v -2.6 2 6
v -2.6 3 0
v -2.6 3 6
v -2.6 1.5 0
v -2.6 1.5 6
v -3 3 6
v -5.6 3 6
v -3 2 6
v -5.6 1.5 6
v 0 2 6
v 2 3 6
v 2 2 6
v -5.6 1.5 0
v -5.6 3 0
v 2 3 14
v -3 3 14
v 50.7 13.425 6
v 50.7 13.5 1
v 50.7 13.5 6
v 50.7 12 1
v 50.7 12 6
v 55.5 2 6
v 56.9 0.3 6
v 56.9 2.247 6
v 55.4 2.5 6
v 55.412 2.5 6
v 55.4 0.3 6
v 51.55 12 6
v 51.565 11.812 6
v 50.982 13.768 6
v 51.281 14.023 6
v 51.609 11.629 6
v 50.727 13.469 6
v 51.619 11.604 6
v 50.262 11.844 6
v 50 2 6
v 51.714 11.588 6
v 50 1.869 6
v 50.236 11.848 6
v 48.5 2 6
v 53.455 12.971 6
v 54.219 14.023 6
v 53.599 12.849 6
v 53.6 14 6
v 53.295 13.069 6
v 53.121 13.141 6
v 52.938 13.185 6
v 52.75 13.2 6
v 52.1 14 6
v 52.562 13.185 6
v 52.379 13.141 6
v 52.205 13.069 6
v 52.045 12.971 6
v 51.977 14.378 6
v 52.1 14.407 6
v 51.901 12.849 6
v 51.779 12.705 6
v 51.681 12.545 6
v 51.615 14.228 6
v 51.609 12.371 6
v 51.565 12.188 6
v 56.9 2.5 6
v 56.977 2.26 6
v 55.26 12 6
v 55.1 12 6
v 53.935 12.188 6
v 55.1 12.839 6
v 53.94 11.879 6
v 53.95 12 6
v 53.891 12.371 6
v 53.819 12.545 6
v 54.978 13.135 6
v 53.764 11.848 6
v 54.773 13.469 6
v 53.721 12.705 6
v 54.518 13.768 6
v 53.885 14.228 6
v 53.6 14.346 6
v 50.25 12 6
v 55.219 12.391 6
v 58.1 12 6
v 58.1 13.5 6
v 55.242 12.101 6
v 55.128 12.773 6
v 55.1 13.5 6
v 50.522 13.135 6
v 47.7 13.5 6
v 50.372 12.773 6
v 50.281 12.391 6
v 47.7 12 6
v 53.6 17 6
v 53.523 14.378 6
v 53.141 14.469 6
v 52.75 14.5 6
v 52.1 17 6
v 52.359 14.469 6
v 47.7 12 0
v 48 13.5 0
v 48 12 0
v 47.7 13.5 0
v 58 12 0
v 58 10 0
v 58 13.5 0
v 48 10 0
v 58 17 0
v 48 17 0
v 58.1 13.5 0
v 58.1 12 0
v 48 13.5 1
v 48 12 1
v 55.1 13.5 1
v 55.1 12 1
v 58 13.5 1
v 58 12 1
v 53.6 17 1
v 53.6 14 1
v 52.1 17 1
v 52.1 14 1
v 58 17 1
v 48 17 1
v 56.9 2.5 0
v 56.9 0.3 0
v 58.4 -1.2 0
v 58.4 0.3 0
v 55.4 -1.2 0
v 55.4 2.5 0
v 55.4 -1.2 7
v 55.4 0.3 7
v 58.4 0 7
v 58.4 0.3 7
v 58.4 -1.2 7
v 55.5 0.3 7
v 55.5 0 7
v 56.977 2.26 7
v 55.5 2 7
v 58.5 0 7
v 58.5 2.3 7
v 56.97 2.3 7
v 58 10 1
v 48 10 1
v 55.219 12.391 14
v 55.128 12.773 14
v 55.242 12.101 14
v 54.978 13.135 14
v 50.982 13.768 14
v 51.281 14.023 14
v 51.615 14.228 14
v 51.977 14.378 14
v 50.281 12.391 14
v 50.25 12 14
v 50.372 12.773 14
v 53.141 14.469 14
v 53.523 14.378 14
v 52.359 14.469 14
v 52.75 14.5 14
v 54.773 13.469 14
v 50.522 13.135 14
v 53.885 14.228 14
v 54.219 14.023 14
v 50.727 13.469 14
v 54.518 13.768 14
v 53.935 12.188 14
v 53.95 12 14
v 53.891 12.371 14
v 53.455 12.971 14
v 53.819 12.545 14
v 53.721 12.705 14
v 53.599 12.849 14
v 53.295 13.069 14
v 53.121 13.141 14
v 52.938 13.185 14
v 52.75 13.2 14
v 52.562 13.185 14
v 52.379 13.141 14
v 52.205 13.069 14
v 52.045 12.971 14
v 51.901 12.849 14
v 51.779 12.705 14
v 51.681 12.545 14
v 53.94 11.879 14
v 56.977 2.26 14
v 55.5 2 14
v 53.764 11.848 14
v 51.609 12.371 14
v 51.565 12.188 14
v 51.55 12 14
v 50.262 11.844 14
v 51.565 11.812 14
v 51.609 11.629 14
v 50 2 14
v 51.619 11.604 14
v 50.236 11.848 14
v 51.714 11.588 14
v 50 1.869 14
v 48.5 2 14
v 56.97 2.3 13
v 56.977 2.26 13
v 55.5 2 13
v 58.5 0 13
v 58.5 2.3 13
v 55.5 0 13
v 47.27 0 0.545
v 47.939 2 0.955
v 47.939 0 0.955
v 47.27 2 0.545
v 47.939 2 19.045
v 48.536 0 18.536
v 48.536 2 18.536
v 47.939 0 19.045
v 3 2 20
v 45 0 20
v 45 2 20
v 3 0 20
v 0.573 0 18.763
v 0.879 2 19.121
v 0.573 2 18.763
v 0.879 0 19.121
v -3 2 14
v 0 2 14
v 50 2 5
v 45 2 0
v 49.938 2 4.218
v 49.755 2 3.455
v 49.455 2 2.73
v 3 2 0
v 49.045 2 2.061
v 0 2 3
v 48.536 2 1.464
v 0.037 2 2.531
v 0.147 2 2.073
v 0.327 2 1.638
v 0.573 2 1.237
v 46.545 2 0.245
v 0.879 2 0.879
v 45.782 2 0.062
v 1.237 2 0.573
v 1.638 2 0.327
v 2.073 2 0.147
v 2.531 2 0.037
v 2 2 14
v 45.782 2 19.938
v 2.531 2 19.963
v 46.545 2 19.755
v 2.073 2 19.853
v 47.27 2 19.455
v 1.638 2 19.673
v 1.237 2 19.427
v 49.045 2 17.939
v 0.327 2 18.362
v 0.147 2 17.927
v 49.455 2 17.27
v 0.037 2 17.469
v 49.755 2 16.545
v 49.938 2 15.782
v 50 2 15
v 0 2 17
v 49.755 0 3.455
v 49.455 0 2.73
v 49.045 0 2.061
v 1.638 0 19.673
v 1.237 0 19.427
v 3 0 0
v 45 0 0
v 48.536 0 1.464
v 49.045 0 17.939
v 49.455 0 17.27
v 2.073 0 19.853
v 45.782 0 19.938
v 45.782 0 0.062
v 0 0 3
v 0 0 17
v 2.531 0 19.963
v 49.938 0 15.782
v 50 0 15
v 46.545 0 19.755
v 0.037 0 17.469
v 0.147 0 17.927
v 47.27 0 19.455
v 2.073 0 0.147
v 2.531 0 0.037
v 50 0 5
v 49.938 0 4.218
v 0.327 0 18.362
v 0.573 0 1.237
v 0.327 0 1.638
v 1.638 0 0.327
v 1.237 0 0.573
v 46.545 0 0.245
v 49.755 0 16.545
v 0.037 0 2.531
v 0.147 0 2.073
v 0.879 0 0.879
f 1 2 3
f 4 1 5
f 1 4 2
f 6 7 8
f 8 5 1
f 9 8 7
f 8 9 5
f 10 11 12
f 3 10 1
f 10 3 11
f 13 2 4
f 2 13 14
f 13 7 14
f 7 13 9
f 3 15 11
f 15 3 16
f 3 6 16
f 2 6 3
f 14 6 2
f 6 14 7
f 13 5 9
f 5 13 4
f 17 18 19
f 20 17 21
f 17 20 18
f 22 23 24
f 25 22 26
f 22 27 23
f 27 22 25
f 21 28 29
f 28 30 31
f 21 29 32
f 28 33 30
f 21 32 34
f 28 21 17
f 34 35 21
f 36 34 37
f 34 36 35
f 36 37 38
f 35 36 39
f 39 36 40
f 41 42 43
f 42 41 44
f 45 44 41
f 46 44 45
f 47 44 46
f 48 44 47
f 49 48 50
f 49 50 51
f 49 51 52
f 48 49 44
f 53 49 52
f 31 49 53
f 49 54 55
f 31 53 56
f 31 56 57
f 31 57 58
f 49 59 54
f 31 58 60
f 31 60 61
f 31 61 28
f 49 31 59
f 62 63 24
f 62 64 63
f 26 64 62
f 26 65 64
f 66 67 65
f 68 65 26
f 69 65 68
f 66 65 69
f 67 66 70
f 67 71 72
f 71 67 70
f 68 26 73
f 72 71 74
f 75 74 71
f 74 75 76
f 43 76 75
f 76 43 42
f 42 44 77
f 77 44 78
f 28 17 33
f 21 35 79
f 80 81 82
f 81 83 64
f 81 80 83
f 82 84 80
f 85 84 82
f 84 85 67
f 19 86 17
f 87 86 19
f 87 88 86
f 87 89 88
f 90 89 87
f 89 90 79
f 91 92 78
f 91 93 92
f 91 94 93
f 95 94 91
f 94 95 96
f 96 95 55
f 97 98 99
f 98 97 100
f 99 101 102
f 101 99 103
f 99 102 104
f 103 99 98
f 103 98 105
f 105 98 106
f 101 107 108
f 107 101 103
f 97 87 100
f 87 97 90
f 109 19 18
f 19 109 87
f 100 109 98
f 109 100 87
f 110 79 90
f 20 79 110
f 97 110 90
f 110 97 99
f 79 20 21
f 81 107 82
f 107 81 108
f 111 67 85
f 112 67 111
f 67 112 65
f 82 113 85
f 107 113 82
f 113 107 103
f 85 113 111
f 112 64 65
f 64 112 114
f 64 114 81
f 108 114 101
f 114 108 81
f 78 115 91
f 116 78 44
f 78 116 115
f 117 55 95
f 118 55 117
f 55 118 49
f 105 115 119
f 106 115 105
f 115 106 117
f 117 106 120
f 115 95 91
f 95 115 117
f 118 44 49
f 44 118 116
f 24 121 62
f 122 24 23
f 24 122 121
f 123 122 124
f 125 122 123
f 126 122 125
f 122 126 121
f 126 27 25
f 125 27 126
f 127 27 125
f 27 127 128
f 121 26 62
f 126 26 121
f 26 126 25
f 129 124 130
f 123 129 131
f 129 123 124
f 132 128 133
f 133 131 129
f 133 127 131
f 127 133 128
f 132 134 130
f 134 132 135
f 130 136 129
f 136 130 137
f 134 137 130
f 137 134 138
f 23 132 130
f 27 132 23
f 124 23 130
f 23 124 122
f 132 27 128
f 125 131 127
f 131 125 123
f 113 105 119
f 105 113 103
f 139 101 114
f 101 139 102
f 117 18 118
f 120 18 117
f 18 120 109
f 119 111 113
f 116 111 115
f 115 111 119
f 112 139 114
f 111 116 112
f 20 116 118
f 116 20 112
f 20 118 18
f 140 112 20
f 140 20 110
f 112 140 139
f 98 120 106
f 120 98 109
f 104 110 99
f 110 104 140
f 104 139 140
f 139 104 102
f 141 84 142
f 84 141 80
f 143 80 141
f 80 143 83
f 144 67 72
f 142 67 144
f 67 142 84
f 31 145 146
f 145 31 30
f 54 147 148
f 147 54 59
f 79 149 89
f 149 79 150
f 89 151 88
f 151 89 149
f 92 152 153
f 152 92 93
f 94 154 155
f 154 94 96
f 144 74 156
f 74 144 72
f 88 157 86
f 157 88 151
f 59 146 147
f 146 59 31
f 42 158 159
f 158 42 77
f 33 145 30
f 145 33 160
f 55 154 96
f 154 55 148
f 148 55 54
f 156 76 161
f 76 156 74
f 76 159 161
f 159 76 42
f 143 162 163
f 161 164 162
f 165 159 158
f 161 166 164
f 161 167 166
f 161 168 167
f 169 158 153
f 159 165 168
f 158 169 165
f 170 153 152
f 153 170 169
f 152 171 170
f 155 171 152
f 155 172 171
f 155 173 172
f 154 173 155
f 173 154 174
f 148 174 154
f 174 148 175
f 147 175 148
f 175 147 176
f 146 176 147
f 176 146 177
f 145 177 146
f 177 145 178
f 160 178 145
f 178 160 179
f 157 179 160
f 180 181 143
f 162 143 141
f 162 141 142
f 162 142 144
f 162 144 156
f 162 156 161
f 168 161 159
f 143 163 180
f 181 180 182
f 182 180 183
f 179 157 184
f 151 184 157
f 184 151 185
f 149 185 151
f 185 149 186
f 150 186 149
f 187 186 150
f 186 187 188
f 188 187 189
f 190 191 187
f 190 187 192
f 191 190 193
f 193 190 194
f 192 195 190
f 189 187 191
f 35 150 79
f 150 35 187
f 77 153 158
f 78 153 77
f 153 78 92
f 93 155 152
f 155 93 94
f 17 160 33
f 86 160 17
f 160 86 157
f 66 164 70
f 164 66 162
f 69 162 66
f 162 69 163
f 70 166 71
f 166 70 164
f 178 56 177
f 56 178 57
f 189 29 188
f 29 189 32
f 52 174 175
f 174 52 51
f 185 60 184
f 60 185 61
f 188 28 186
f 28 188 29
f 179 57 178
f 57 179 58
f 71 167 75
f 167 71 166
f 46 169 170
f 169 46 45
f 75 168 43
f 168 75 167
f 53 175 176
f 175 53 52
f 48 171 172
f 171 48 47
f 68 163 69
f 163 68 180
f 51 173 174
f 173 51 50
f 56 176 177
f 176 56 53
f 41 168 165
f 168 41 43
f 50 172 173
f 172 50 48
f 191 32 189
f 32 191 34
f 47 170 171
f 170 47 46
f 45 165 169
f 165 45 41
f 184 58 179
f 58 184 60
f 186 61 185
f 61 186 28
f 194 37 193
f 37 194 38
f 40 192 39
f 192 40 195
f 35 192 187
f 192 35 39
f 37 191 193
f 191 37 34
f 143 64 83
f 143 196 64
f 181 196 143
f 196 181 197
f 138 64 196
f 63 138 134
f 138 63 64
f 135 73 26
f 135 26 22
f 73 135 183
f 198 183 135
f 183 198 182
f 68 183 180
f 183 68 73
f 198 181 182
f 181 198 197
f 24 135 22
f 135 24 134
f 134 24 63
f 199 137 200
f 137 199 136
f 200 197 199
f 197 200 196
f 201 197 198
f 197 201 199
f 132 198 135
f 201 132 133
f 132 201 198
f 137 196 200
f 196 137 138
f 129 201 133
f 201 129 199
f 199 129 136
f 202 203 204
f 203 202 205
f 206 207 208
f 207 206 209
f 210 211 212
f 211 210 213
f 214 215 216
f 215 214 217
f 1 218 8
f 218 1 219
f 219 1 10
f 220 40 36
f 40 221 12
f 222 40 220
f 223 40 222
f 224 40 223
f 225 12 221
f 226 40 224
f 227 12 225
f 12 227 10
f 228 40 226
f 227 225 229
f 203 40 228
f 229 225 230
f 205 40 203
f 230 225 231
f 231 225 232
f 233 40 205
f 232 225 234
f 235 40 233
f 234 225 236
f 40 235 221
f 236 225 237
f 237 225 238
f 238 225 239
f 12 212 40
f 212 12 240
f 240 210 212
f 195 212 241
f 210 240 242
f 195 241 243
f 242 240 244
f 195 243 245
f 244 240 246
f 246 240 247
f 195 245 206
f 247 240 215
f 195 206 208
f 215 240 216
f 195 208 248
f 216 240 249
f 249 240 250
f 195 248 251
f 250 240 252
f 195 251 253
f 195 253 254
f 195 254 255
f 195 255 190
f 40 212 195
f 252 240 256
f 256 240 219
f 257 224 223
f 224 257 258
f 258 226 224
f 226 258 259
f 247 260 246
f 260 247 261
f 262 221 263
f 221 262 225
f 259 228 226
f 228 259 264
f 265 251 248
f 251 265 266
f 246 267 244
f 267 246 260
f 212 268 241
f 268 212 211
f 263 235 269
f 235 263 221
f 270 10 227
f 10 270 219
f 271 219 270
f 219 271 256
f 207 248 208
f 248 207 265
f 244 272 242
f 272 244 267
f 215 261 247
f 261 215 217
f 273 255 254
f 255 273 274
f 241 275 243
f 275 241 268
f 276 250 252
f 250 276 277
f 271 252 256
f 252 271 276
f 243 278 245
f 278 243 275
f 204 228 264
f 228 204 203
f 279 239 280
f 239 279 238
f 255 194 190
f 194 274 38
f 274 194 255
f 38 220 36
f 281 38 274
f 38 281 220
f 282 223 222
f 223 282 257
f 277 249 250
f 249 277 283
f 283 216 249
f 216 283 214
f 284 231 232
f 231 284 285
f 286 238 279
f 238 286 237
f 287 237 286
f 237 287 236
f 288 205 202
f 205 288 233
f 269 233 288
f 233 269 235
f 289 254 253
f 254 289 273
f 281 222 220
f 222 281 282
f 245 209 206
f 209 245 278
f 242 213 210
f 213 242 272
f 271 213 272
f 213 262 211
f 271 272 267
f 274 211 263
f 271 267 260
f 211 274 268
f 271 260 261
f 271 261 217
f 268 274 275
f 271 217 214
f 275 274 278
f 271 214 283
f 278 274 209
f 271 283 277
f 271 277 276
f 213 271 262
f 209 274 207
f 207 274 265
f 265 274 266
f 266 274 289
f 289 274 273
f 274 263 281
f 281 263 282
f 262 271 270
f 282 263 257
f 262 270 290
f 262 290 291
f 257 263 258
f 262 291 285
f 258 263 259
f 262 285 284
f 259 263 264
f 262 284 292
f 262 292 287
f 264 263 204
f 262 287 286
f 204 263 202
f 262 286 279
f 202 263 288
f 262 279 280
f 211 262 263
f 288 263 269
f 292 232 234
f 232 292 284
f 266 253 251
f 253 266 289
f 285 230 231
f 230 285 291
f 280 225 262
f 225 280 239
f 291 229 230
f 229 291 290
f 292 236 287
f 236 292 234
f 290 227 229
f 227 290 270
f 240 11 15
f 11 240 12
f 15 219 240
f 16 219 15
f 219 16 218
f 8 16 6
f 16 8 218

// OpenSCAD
$fn = 40;

//length
l = 50;

//width
w = 20;

//thickness
th = 2;


//////top fastener
//width
tfw = 8;

//length
tfl = 5;

//thickness
tfth = 1;


//////bottom fastener
//width
bfw = 8;

//bottom length
bfbl = 10;

//height
bfh = 10;

//top length
bftl = 20;

//thickness
bfth = 1.5;

//lip length
bfll = 3;

//lip width
bflw = 6;


module lucka(r1=3, r2=5)
{
  hull()
  {
  translate([r1,0,0])
  cube([l-r1-r2, th, w]);

  translate([3,2,3])
  rotate([90,0,0])
  cylinder(r=r1, h=th);

  translate([r1,2,-r1+w])
  rotate([90,0,0])
  cylinder(r=r1, h=th);


  translate([l-r2,2,-r2+w])
  rotate([90,0,0])
  cylinder(r=r2, h=th);

  translate([l-r2,2,r2])
  rotate([90,0,0])
  cylinder(r=r2, h=th);
  }

  module top_fastener(overlap=2)
  {
    translate([overlap-tfl,th,w/2-tfw/2])
    cube([tfl,tfth,tfw]);
  }

  top_fastener();

  module bottom_fastener()
  {
    translate([l-bfth,th,w/2-bfw/2])
    rotate([0,0,-10])
    cube([bfth,bfh,bfw]);


    translate([l-bfth+7,th,w/2-bfw/2])
    rotate([0,0,10])
    cube([bfth,bfh,bfw]);


      translate([l-bfth+4.25,th+10,w/2-bfw/2])
    {
    difference()
    {
    cylinder(r=2.5, h=bfw);
    cylinder(r=2.5-bfth+.2, h=bfw);
    translate([-5,-10-.5,0])
    cube([10,10,10]);
    }
    }

    
    translate([l-bfth+7,0,w/2-bflw/2])
    cube([bfll,bfth+.8,bflw]);
  }


  bottom_fastener();
}

module supports()
{
translate([-5.6,1.5,0])
cube([3,1.5,6]);

translate([l-2.3,12,0])
cube([3,1.5,6]);

translate([l+5.1,12,0])
cube([3,1.5,6]);

translate([l+2.1,14,0])
cube([1.5,3,6]);


translate([l+5.4,-.5,0])
cube([1.5,3,6]);


translate([l+5.4,-1.2,0])
cube([3,1.5,7]);



translate([l-2,10,0])
cube([10,7,1]);


}

color("blue")
supports();



lucka();
